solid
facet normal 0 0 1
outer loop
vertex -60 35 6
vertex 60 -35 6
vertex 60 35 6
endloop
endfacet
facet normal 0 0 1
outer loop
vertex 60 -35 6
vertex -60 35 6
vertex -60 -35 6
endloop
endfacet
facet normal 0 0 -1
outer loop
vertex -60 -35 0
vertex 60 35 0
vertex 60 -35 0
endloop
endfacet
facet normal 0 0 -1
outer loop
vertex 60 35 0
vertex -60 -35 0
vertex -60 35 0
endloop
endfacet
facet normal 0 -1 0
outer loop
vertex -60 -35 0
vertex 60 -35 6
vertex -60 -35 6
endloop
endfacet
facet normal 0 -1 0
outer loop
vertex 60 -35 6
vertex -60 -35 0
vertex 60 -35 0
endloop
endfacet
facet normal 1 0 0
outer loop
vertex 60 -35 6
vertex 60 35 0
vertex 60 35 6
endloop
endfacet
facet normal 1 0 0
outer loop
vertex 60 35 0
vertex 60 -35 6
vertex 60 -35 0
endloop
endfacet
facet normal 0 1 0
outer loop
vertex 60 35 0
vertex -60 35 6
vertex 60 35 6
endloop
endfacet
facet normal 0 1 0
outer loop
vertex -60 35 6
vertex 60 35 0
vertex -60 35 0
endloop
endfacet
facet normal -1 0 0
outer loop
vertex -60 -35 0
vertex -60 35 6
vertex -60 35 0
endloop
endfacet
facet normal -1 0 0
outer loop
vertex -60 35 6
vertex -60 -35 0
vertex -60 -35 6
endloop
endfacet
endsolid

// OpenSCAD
// file: ../components/mounting-plate/mounting_plate.scad
// File: mounting_plate.scad
//   Project-specific mounting plate used by the reference assembly.
//
// FileSummary: Simple rectangular mounting surface.
//
// Module: mounting_plate()
// Usage:
//   mounting_plate();
// Description:
//   Creates the mounting plate centered in X/Y with its base at Z=0.
// Arguments:
//   width = Overall X dimension.
//   height = Overall Y dimension.
//   thickness = Plate thickness.
MOUNTING_PLATE_WIDTH = 120;
MOUNTING_PLATE_HEIGHT = 70;
MOUNTING_PLATE_THICKNESS = 6;


// Function: mounting_plate_thickness()
// Usage:
//   thickness = mounting_plate_thickness();
// Description:
//   Returns the default mounting plate thickness for consumers that import
//   this file with `use`.
function mounting_plate_thickness() = MOUNTING_PLATE_THICKNESS;

module mounting_plate(
    width = MOUNTING_PLATE_WIDTH,
    height = MOUNTING_PLATE_HEIGHT,
    thickness = MOUNTING_PLATE_THICKNESS
) {
    translate([-width / 2, -height / 2, 0])
        cube([width, height, thickness]);
}

// Module: mounting_plate_design()
// Usage:
//   mounting_plate_design("base");
//   mounting_plate_design("final");
// Description:
//   Documentation-oriented views for the mounting plate.
// Arguments:
//   view = Named design-documentation view.
module mounting_plate_design(view = "final") {
    if (view == "base")
        color([1, 0, 0, 0.55]) mounting_plate();
    else
        mounting_plate();
}
// main file
// Stable build entrypoint for the standalone mounting plate.
use <../components/mounting-plate/mounting_plate.scad>

mounting_plate();
